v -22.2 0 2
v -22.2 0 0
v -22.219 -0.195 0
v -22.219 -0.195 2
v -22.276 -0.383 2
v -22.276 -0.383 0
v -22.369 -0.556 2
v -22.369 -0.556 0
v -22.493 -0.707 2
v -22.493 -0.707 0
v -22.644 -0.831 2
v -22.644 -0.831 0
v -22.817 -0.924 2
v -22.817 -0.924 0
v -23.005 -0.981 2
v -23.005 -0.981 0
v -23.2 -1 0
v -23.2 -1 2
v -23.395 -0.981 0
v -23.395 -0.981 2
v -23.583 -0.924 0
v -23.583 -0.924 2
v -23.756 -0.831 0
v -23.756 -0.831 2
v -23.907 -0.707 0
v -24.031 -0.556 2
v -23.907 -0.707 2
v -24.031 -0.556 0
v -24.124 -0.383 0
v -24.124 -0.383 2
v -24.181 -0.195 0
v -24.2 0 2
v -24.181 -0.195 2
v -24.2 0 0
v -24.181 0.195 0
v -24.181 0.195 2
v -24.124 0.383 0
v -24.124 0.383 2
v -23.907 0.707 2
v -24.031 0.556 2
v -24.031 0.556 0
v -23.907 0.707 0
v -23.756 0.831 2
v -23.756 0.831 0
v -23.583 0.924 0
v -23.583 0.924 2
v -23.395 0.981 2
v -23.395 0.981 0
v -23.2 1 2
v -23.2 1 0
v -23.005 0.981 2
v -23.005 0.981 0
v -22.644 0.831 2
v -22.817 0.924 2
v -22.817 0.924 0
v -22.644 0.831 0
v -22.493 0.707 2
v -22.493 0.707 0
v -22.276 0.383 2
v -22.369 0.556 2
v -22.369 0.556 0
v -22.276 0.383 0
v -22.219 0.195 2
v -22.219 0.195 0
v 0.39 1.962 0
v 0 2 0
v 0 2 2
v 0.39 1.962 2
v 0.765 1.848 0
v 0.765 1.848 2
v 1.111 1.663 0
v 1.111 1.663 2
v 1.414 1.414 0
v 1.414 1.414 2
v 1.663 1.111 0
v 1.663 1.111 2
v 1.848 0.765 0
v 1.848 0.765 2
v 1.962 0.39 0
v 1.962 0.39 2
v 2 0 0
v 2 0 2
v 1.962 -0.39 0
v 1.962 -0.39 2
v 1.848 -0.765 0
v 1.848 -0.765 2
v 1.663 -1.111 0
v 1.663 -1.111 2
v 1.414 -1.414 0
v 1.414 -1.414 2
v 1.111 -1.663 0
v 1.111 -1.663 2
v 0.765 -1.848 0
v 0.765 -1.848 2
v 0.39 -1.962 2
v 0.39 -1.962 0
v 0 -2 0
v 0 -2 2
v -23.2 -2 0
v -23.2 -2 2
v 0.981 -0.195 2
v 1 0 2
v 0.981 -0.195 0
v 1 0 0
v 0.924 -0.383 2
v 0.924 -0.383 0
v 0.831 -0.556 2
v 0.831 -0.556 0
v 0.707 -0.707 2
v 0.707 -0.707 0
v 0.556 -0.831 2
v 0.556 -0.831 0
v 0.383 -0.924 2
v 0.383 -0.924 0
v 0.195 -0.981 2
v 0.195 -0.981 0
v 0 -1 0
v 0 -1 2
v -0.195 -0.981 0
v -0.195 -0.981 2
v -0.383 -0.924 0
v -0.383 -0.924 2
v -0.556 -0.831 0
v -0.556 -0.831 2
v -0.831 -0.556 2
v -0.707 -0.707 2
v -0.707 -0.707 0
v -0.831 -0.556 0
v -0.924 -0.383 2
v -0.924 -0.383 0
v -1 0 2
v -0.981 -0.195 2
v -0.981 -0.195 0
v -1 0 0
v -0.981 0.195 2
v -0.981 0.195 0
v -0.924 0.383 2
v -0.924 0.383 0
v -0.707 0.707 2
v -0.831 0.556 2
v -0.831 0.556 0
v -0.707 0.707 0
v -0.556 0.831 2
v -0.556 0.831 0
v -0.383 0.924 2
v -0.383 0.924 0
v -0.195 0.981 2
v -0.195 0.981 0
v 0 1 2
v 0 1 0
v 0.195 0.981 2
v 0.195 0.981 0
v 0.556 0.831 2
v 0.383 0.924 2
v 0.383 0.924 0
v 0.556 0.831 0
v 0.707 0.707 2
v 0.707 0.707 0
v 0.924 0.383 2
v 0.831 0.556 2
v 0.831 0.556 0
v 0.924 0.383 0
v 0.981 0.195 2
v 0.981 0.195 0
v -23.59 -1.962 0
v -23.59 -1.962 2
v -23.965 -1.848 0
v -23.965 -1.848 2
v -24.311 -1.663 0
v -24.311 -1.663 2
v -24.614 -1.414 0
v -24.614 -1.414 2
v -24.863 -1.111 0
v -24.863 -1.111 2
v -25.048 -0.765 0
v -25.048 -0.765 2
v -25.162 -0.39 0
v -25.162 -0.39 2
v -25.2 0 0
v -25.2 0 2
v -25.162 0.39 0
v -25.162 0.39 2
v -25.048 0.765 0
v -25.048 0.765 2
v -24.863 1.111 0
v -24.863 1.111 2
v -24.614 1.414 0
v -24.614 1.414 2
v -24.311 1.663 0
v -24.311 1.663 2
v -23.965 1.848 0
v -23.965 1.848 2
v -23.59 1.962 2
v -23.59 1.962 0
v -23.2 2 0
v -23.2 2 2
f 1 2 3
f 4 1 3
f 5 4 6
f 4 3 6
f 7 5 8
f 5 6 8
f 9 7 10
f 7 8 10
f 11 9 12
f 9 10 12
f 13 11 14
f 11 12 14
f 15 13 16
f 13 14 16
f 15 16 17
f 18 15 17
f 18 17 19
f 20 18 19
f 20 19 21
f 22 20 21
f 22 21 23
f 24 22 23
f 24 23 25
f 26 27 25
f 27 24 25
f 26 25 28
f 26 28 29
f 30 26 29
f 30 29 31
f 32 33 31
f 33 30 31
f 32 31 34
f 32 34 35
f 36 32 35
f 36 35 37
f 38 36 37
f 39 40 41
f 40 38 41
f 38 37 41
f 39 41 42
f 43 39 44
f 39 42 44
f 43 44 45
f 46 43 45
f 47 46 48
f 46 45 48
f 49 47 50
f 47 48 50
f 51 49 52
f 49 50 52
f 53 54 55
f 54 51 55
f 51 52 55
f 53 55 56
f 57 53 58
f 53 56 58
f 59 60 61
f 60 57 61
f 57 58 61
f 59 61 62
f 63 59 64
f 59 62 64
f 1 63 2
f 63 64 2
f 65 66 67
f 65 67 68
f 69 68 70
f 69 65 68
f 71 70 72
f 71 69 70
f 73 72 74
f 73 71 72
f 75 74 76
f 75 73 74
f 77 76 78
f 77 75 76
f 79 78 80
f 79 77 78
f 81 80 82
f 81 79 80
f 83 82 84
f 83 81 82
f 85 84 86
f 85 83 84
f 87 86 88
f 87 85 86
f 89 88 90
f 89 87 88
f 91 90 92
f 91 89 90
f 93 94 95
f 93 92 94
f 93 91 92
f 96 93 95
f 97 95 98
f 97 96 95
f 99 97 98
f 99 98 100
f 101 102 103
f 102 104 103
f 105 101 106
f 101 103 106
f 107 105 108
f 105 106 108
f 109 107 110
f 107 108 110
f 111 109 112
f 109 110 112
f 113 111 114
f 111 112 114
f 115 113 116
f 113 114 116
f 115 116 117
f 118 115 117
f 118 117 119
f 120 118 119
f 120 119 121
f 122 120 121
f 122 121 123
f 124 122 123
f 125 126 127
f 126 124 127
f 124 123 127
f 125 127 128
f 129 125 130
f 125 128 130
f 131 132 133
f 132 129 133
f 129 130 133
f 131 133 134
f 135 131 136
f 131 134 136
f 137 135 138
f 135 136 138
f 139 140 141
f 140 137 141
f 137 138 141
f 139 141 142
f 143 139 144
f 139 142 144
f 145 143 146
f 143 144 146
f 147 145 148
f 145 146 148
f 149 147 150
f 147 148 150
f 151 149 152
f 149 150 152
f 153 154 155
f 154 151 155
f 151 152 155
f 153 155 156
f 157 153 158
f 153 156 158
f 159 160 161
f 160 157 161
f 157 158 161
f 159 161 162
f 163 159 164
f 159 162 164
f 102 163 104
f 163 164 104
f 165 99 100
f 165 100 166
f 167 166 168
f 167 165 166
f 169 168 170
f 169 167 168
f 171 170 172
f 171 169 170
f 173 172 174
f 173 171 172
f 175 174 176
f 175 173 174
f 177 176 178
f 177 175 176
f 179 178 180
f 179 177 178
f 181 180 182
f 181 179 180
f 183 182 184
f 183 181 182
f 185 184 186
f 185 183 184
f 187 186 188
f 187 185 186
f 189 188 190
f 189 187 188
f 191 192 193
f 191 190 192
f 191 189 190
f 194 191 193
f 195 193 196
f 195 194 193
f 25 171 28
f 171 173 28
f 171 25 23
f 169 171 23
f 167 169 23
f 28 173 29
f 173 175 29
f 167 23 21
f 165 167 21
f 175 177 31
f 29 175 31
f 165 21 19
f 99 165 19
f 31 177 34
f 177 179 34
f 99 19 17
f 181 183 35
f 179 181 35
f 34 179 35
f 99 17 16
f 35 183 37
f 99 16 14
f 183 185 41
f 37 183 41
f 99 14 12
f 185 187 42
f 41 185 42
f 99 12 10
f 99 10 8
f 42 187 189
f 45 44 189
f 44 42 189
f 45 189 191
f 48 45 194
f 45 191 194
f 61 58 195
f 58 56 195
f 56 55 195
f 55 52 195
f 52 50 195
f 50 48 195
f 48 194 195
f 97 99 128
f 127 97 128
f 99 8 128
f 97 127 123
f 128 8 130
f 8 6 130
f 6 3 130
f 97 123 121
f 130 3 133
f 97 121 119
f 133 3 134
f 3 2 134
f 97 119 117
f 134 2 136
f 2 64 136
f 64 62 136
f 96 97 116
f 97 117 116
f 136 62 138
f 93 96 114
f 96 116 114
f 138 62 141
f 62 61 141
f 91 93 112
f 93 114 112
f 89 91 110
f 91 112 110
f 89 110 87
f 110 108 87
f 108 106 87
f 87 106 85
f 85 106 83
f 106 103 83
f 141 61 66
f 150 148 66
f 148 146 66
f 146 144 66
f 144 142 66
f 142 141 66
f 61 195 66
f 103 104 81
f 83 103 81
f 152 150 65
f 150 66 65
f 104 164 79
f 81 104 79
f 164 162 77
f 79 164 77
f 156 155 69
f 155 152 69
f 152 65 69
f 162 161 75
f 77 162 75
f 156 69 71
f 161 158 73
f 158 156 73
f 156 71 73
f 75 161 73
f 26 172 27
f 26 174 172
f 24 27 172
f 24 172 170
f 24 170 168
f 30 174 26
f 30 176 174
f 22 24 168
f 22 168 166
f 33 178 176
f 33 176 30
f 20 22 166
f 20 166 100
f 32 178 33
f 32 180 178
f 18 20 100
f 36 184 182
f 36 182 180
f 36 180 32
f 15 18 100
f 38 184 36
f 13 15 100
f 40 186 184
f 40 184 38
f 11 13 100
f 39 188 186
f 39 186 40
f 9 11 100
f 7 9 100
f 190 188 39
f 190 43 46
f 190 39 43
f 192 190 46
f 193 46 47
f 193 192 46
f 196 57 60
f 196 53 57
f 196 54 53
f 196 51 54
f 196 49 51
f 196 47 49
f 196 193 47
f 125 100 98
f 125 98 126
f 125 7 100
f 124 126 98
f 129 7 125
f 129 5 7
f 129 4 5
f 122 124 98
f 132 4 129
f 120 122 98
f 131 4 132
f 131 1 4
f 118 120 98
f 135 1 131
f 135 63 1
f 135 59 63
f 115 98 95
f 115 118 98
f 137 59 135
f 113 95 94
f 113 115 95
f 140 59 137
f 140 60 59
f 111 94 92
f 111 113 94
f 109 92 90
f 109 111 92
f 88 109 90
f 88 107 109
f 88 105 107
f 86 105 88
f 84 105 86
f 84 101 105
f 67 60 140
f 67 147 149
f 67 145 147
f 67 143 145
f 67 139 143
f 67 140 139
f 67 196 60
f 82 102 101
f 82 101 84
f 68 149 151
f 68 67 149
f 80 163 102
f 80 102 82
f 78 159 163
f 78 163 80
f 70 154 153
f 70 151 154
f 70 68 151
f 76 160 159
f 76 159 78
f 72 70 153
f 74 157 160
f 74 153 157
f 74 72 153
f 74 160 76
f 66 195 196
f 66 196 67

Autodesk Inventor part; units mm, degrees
ref_plane "YZ Plane" through (0, 0, 0) normal (1, 0, 0) x (0, 1, 0)
ref_plane "XZ Plane" through (0, 0, 0) normal (0, 1, 0) x (-1, 0, 0)
ref_plane "XY Plane" through (0, 0, 0) normal (0, 0, 1) x (1, 0, 0)
sketch "Sketch1" plane through (0, 0, 0) normal (0, 0, 1) x (1, 0, 0)
  circle A0 centre (0, 0) radius 1
  circle A1 centre (-23.2, 0) radius 1
  line L0 (-23.2, 2) -> (0, 2)
  arc A2 (0, -2) -> (0, 2) centre (0, 0) ccw
  line L1 (0, -2) -> (-23.2, -2)
  arc A3 (-23.2, 2) -> (-23.2, -2) centre (-23.2, 0) ccw
  dimension "d0" = 2
  dimension "d1" = 23.2
  dimension "d2" = 2
extrude "Extrusion1" add sketch "Sketch1" along normal blind 2
properties part number "panto_linkageB"
